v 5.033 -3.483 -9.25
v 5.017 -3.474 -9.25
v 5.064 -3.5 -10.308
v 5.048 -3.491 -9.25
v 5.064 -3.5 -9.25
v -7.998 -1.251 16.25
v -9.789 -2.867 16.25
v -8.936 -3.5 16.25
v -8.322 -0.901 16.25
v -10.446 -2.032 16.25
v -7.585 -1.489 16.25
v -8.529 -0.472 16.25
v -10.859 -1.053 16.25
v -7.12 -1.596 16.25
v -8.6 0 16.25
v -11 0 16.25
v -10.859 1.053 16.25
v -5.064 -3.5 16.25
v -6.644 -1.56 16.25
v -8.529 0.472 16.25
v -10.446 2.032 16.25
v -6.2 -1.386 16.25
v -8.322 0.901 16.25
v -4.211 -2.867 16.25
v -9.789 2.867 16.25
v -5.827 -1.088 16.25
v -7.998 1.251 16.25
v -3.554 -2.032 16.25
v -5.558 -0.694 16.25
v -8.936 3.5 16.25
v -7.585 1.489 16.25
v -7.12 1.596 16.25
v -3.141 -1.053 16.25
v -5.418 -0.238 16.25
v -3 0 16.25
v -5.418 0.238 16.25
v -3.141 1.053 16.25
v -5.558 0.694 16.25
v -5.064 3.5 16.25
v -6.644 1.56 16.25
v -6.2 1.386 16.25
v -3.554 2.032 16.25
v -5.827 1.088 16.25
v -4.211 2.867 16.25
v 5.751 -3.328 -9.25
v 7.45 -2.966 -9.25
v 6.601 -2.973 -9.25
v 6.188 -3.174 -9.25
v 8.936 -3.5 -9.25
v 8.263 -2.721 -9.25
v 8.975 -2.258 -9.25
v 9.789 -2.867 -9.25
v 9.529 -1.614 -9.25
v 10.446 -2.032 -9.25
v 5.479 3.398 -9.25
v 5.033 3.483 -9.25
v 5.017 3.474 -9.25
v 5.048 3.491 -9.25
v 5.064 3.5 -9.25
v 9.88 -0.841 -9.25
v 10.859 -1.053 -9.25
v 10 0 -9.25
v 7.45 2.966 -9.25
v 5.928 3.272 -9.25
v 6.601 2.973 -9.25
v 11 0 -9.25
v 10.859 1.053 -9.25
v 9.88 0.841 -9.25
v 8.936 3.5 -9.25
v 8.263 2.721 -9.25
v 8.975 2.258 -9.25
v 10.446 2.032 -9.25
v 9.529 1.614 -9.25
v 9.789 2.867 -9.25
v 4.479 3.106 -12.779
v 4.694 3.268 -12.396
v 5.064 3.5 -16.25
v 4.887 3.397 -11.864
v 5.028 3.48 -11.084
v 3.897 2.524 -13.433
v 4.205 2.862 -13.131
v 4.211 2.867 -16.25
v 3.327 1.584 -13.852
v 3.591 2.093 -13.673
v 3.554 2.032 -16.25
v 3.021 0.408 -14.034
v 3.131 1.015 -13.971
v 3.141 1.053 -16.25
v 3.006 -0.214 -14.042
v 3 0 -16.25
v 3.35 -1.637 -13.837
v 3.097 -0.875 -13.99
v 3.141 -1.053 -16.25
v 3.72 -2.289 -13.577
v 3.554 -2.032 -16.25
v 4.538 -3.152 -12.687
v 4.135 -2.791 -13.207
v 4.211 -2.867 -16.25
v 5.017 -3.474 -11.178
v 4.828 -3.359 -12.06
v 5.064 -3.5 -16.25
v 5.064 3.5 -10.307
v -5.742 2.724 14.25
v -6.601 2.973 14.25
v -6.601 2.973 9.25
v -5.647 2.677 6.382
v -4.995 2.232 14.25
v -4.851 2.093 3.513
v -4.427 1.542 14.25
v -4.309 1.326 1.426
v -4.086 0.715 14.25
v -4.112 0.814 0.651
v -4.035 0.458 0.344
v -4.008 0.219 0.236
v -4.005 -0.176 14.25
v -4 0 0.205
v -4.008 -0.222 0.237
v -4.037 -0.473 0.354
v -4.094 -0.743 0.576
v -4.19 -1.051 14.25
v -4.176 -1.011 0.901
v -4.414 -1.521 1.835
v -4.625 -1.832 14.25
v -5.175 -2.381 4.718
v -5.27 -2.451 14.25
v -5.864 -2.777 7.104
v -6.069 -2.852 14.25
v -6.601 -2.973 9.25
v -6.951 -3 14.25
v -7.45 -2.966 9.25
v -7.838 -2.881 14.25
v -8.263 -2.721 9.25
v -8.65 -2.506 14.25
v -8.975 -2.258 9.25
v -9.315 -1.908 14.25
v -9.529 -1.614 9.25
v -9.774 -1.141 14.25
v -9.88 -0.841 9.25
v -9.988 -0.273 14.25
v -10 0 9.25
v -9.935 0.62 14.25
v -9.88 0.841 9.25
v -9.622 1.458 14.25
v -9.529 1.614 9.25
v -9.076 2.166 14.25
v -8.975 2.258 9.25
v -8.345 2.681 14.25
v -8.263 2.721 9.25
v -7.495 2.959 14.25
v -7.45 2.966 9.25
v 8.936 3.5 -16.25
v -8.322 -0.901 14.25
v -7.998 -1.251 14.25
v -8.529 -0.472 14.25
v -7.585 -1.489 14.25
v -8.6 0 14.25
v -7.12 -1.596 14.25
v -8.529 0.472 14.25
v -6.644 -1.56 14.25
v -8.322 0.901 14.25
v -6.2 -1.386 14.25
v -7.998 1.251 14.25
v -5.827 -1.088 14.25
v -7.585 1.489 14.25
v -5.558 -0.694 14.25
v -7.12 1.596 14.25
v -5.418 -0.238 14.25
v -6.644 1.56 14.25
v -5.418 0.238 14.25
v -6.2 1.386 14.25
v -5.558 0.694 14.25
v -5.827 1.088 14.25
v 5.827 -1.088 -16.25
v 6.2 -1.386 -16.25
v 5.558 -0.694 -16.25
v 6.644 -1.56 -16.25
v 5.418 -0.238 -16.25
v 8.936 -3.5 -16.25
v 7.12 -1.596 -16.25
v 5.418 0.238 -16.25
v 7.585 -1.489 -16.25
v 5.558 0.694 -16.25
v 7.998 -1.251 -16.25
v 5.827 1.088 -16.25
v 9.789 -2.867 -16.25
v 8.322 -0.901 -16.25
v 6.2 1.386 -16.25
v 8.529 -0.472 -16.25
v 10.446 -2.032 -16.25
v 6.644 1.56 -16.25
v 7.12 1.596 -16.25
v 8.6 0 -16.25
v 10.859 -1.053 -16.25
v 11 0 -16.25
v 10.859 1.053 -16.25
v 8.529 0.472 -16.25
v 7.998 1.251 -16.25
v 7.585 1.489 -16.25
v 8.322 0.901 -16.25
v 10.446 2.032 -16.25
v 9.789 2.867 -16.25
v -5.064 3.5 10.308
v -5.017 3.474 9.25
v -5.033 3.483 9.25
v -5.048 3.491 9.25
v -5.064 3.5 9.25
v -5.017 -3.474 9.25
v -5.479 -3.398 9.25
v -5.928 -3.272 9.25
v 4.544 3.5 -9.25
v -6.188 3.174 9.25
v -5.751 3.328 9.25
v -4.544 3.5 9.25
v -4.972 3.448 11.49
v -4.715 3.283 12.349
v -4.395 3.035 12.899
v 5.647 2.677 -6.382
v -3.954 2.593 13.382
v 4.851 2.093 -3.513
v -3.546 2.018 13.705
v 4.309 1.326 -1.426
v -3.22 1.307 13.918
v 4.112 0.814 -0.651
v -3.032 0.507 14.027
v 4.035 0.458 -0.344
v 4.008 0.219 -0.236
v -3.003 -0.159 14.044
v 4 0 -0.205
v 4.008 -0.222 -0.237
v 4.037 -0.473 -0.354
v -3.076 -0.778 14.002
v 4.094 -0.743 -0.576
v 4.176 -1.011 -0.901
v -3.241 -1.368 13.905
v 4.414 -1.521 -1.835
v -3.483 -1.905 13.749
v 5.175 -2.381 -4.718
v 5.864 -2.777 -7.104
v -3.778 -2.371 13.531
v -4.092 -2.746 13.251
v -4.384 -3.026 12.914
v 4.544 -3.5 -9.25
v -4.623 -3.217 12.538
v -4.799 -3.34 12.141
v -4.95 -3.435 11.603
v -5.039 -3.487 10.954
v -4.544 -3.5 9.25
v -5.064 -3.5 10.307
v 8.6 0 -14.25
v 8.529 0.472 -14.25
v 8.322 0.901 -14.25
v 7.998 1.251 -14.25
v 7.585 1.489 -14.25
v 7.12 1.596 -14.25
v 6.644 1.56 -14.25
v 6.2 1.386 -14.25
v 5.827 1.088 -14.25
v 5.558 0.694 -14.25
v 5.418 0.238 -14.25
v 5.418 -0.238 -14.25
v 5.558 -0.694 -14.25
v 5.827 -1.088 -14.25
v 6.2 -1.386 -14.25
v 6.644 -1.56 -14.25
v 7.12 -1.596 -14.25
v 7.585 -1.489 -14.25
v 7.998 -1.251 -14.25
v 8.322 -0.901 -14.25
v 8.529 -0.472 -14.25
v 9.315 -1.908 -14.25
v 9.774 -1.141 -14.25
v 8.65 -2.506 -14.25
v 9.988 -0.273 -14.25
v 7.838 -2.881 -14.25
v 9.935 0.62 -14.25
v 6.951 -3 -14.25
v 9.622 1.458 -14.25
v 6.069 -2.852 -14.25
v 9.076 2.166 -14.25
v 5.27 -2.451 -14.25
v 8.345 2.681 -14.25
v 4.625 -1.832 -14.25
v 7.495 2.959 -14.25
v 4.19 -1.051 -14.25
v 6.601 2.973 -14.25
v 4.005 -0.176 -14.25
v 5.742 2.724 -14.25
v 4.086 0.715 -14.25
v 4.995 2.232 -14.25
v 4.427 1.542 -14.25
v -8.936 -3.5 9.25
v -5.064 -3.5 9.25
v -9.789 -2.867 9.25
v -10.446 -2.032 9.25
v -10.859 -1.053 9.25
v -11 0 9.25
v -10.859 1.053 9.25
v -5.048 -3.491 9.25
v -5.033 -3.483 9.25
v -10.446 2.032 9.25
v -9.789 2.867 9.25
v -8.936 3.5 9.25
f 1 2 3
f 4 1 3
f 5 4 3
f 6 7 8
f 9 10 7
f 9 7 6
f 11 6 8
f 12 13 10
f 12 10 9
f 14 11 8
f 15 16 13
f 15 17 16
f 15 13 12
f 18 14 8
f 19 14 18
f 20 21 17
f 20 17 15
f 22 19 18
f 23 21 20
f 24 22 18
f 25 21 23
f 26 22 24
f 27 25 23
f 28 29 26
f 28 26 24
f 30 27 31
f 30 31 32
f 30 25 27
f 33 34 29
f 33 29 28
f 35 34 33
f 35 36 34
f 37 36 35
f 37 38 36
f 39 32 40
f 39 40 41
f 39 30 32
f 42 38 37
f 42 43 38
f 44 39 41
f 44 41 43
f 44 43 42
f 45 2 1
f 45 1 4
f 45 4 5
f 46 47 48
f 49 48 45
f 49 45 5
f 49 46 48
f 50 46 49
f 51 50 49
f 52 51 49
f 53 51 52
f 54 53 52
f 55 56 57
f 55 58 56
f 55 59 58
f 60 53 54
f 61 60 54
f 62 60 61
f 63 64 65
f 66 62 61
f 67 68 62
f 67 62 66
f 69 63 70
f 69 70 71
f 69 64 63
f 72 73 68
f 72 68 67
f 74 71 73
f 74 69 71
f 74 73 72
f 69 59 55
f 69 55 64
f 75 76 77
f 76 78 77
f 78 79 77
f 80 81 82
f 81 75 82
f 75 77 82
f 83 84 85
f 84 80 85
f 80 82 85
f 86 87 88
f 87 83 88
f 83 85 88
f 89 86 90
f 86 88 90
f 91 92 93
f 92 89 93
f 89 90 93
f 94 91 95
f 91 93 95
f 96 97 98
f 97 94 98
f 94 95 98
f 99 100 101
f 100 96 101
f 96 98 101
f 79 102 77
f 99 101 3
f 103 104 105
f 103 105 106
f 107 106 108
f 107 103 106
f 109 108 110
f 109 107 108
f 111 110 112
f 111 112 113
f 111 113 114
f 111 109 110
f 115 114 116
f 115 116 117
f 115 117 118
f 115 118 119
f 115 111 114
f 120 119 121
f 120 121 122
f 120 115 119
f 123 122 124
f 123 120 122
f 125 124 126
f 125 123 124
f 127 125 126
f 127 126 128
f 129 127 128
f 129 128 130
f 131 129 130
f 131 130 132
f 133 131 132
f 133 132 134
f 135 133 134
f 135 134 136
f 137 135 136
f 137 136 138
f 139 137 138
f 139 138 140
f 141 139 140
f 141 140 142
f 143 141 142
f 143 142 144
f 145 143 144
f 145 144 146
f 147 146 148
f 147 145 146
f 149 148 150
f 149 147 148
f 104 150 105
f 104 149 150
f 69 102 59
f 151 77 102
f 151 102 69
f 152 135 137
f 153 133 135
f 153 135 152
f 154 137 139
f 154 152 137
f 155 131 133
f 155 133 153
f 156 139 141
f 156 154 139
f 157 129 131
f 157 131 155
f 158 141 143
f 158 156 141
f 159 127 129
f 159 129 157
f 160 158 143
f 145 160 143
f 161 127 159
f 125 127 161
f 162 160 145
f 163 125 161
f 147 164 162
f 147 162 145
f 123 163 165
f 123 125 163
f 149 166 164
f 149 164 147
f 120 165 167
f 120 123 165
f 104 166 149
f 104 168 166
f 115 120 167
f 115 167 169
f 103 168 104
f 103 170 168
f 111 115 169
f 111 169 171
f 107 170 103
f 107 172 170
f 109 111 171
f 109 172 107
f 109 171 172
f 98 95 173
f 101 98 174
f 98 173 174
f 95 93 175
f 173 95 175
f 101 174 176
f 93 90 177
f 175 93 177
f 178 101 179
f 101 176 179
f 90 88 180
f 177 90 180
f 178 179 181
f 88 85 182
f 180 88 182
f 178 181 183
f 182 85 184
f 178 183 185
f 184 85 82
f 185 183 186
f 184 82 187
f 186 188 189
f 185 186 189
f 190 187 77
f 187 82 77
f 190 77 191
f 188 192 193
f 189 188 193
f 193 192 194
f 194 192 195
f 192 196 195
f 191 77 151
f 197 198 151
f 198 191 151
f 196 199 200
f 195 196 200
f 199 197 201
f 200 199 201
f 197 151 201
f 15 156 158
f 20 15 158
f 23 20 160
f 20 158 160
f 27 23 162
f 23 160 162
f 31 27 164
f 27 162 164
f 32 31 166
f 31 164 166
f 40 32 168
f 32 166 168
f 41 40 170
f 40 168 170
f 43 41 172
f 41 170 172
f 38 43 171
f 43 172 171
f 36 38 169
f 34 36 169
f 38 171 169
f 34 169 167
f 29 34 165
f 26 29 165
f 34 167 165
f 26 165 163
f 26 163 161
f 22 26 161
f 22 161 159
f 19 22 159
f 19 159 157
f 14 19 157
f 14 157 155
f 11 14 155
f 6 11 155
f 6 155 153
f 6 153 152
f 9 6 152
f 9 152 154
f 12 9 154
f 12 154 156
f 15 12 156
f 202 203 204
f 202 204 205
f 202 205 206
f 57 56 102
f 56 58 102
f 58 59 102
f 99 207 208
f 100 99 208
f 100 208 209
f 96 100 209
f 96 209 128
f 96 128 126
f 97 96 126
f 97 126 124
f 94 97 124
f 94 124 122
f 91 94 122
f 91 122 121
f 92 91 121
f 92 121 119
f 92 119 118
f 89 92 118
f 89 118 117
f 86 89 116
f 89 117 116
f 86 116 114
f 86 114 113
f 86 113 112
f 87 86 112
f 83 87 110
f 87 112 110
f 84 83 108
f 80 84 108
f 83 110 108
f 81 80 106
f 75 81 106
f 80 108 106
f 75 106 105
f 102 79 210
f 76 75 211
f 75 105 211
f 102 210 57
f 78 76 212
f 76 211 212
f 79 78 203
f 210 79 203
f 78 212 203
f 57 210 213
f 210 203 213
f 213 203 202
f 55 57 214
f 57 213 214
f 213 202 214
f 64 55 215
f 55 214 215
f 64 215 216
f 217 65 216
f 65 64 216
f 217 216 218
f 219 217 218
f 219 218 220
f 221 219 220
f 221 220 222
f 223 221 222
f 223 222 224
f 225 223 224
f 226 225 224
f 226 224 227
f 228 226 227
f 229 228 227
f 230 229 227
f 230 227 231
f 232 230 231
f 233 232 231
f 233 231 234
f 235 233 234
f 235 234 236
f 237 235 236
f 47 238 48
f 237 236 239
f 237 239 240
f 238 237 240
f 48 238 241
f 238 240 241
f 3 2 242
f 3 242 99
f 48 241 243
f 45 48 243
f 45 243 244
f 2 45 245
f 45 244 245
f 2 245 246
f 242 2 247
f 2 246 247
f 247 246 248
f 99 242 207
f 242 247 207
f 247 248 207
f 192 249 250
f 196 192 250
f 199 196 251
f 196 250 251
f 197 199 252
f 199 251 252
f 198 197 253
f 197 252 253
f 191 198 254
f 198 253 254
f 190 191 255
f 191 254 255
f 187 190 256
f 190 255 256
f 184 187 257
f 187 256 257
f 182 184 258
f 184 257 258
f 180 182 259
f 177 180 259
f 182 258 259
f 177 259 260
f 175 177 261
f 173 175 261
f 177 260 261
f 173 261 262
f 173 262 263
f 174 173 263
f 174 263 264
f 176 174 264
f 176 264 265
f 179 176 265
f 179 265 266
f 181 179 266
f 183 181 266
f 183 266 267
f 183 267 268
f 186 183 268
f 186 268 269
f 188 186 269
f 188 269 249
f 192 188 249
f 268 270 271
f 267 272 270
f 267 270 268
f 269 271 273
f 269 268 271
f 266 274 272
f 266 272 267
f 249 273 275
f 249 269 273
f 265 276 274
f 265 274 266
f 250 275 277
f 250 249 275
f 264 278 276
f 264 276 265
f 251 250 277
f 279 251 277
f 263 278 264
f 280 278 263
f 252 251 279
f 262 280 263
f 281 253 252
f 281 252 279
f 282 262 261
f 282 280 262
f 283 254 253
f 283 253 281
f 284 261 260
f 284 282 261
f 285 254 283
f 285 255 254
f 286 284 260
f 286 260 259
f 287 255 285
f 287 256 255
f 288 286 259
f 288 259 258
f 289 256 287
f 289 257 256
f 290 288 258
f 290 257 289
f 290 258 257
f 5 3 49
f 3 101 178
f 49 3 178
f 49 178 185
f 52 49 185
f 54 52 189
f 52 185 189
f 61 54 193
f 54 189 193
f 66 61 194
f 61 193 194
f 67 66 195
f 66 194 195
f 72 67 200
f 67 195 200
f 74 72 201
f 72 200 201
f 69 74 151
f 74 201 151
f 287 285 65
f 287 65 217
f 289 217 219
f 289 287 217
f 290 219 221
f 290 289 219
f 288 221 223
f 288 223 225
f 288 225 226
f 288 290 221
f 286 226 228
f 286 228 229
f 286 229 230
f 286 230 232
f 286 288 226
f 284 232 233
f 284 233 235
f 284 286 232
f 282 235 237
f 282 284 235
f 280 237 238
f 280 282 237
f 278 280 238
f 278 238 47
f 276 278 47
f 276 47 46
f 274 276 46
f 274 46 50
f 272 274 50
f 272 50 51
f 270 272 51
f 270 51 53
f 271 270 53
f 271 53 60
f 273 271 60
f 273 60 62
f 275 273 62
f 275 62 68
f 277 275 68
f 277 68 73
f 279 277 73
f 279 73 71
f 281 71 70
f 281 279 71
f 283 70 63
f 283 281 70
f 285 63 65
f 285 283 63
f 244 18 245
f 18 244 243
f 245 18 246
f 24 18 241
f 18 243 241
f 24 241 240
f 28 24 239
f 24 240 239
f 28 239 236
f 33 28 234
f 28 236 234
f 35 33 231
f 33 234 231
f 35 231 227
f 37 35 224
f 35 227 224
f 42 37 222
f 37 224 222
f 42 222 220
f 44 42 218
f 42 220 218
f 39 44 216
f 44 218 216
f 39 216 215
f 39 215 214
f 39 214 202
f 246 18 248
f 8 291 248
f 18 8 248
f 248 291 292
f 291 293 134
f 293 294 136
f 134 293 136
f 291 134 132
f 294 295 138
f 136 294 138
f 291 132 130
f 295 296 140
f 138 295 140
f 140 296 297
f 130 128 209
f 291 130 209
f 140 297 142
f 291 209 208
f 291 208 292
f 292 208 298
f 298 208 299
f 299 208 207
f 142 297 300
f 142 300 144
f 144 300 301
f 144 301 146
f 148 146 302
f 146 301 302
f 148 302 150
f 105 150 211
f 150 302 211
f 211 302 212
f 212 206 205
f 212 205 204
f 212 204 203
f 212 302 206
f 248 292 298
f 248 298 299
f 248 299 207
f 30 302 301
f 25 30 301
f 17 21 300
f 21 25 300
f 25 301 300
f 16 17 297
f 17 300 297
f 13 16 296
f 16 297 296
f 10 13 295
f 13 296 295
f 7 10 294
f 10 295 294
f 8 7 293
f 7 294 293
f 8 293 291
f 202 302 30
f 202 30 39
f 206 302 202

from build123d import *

# Parameters (mm, degrees)
BOSS_EXTRUDE1_DEPTH      = 2
BOSS_EXTRUDE1_DEPTH_BACK = 5
SKETCH3_R                = 4
BOSS_EXTRUDE2_DEPTH      = 5
BOSS_EXTRUDE2_DEPTH_BACK = 2
SKETCH2_R                = 4
BOSS_EXTRUDE3_START      = -13.929206
SKETCH4_R                = 3.5
BOSS_EXTRUDE3_DEPTH      = 27.858412
CUT_EXTRUDE1_DEPTH       = 29.057975838
CUT_EXTRUDE1_DEPTH_BACK  = 5
SKETCH5_R                = 3
CUT_EXTRUDE2_DEPTH       = 29.057975747
CUT_EXTRUDE2_DEPTH_BACK  = 5
SKETCH6_R                = 3
SKETCH7_R                = 1.6
CUT_EXTRUDE3_DEPTH       = 33.668792587
SKETCH8_R                = 1.6
CUT_EXTRUDE4_DEPTH       = 33.668792494
SPLIT1_START             = -4.0000001
SPLIT1_OUTLINE_W         = 20
SPLIT1_OUTLINE_H         = 8.75
SPLIT1_DEPTH             = 0.5000001
SPLIT1_START_2           = 3.5
SPLIT1_2_OUTLINE_W       = 20
SPLIT1_2_OUTLINE_H       = 8.75
SPLIT1_2_DEPTH           = 0.5
SPLIT1_START_3           = -16.25
SPLIT1_3_DEPTH           = 7
SPLIT1_START_4           = 9.25
SPLIT1_4_DEPTH           = 7
SPLIT1_5_DEPTH           = 7
SPLIT1_6_DEPTH           = 7


# Read off the part's stored shape, not the designer's step: Split1
with BuildPart() as part:
    # Sketch3 → Boss-Extrude1 (new, two sides: drawn at the far end of the back side and taken through both)
    with BuildSketch(Plane(origin=(-7, 0, 14.25), x_dir=(1, 0, 0), z_dir=(0, 0, 1)).offset(-BOSS_EXTRUDE1_DEPTH_BACK)):
        Circle(SKETCH3_R)
    extrude(amount=BOSS_EXTRUDE1_DEPTH + BOSS_EXTRUDE1_DEPTH_BACK)



with BuildPart() as body_2:
    # Sketch2 → Boss-Extrude2 (new, two sides: drawn at the far end of the back side and taken through both)
    with BuildSketch(Plane(origin=(7, 0, -14.25), x_dir=(1, 0, 0), z_dir=(0, 0, 1)).offset(-BOSS_EXTRUDE2_DEPTH_BACK)):
        Circle(SKETCH2_R)
    extrude(amount=BOSS_EXTRUDE2_DEPTH + BOSS_EXTRUDE2_DEPTH_BACK)


with BuildPart() as part_1:
    add(part.part)

    add(body_2.part)  # Boss-Extrude3 merges body 2
    # Sketch4 → Boss-Extrude3 (add)
    with BuildSketch(Plane(origin=(0, 0, 0), x_dir=(-0.8975543264374148, 0, -0.44090387965346695), z_dir=(0.44090387965346695, 0, -0.8975543264374148)).offset(BOSS_EXTRUDE3_START)):
        with Locations(Location((0, 0, 0), (0, 0, 276.975190017))):
            Circle(SKETCH4_R)
    extrude(amount=BOSS_EXTRUDE3_DEPTH)

    # Sketch5 → Cut-Extrude1 (cut, two sides: drawn at the far end of the back side and taken through both)
    with BuildSketch(Plane.XY.offset(-9.25).offset(-CUT_EXTRUDE1_DEPTH_BACK)):
        with Locations(Location((7, 0, 0), (0, 0, 97.643118007))):
            Circle(SKETCH5_R)
    extrude(amount=CUT_EXTRUDE1_DEPTH + CUT_EXTRUDE1_DEPTH_BACK, mode=Mode.SUBTRACT)

    # Sketch6 → Cut-Extrude2 (cut, two sides: drawn at the far end of the back side and taken through both)
    with BuildSketch(Plane(origin=(0, 0, 9.25), x_dir=(-1, 0, 0), z_dir=(0, 0, -1)).offset(-CUT_EXTRUDE2_DEPTH_BACK)):
        with Locations(Location((7, 0, 0), (0, 0, 97.643118007))):
            Circle(SKETCH6_R)
    extrude(amount=CUT_EXTRUDE2_DEPTH + CUT_EXTRUDE2_DEPTH_BACK, mode=Mode.SUBTRACT)

    # Sketch7 → Cut-Extrude3 (cut, through all)
    with BuildSketch(Plane.XY.offset(-14.25)):
        with Locations((7, 0)):
            Circle(SKETCH7_R)
    extrude(amount=-CUT_EXTRUDE3_DEPTH, mode=Mode.SUBTRACT)

    # Sketch8 → Cut-Extrude4 (cut, through all)
    with BuildSketch(Plane(origin=(0, 0, 14.25), x_dir=(-1, 0, 0), z_dir=(0, 0, -1))):
        with Locations((7, 0)):
            Circle(SKETCH8_R)
    extrude(amount=-CUT_EXTRUDE4_DEPTH, mode=Mode.SUBTRACT)

    # Split1 outline → Split1 (cut)
    with BuildSketch(Plane(origin=(0, 0, 0), x_dir=(1, 0, 0), z_dir=(0, 1, 0)).offset(SPLIT1_START)):
        with Locations((0, -13.625)):
            Rectangle(SPLIT1_OUTLINE_W, SPLIT1_OUTLINE_H)
        with Locations((0, 13.625)):
            Rectangle(SPLIT1_OUTLINE_W, SPLIT1_OUTLINE_H)
    extrude(amount=SPLIT1_DEPTH, mode=Mode.SUBTRACT)

    # Split1 2 outline → Split1 2 (cut)
    with BuildSketch(Plane(origin=(0, 0, 0), x_dir=(1, 0, 0), z_dir=(0, 1, 0)).offset(SPLIT1_START_2)):
        with Locations((0, -13.625)):
            Rectangle(SPLIT1_2_OUTLINE_W, SPLIT1_2_OUTLINE_H)
        with Locations((0, 13.625)):
            Rectangle(SPLIT1_2_OUTLINE_W, SPLIT1_2_OUTLINE_H)
    extrude(amount=SPLIT1_2_DEPTH, mode=Mode.SUBTRACT)


with BuildPart() as body_2_2:
    # Split1 3 outline → Split1 3 (new body)
    with BuildSketch(Plane.XY.offset(SPLIT1_START_3)):
        with BuildLine():
            ThreePointArc((5.063508327, -3.5), (7, -4), (8.936491673, -3.5))
            Line((8.936491673, -3.5), (5.063508327, -3.5))
        make_face()
    extrude(amount=SPLIT1_3_DEPTH)


with BuildPart() as body_3:
    # Split1 4 outline → Split1 4 (new body)
    with BuildSketch(Plane.XY.offset(SPLIT1_START_4)):
        with BuildLine():
            ThreePointArc((-8.936491673, -3.5), (-7, -4), (-5.063508327, -3.5))
            Line((-5.063508327, -3.5), (-8.936491673, -3.5))
        make_face()
    extrude(amount=SPLIT1_4_DEPTH)


with BuildPart() as body_4:
    # Split1 5 outline → Split1 5 (new body)
    with BuildSketch(Plane.XY.offset(SPLIT1_START_4)):
        with BuildLine():
            Line((-8.936491673, 3.5), (-5.063508327, 3.5))
            ThreePointArc((-5.063508327, 3.5), (-7, 4), (-8.936491673, 3.5))
        make_face()
    extrude(amount=SPLIT1_5_DEPTH)


with BuildPart() as body_5:
    # Split1 6 outline → Split1 6 (new body)
    with BuildSketch(Plane.XY.offset(SPLIT1_START_3)):
        with BuildLine():
            Line((5.063508327, 3.5), (8.936491673, 3.5))
            ThreePointArc((8.936491673, 3.5), (7, 4), (5.063508327, 3.5))
        make_face()
    extrude(amount=SPLIT1_6_DEPTH)


solid = part_1.part
